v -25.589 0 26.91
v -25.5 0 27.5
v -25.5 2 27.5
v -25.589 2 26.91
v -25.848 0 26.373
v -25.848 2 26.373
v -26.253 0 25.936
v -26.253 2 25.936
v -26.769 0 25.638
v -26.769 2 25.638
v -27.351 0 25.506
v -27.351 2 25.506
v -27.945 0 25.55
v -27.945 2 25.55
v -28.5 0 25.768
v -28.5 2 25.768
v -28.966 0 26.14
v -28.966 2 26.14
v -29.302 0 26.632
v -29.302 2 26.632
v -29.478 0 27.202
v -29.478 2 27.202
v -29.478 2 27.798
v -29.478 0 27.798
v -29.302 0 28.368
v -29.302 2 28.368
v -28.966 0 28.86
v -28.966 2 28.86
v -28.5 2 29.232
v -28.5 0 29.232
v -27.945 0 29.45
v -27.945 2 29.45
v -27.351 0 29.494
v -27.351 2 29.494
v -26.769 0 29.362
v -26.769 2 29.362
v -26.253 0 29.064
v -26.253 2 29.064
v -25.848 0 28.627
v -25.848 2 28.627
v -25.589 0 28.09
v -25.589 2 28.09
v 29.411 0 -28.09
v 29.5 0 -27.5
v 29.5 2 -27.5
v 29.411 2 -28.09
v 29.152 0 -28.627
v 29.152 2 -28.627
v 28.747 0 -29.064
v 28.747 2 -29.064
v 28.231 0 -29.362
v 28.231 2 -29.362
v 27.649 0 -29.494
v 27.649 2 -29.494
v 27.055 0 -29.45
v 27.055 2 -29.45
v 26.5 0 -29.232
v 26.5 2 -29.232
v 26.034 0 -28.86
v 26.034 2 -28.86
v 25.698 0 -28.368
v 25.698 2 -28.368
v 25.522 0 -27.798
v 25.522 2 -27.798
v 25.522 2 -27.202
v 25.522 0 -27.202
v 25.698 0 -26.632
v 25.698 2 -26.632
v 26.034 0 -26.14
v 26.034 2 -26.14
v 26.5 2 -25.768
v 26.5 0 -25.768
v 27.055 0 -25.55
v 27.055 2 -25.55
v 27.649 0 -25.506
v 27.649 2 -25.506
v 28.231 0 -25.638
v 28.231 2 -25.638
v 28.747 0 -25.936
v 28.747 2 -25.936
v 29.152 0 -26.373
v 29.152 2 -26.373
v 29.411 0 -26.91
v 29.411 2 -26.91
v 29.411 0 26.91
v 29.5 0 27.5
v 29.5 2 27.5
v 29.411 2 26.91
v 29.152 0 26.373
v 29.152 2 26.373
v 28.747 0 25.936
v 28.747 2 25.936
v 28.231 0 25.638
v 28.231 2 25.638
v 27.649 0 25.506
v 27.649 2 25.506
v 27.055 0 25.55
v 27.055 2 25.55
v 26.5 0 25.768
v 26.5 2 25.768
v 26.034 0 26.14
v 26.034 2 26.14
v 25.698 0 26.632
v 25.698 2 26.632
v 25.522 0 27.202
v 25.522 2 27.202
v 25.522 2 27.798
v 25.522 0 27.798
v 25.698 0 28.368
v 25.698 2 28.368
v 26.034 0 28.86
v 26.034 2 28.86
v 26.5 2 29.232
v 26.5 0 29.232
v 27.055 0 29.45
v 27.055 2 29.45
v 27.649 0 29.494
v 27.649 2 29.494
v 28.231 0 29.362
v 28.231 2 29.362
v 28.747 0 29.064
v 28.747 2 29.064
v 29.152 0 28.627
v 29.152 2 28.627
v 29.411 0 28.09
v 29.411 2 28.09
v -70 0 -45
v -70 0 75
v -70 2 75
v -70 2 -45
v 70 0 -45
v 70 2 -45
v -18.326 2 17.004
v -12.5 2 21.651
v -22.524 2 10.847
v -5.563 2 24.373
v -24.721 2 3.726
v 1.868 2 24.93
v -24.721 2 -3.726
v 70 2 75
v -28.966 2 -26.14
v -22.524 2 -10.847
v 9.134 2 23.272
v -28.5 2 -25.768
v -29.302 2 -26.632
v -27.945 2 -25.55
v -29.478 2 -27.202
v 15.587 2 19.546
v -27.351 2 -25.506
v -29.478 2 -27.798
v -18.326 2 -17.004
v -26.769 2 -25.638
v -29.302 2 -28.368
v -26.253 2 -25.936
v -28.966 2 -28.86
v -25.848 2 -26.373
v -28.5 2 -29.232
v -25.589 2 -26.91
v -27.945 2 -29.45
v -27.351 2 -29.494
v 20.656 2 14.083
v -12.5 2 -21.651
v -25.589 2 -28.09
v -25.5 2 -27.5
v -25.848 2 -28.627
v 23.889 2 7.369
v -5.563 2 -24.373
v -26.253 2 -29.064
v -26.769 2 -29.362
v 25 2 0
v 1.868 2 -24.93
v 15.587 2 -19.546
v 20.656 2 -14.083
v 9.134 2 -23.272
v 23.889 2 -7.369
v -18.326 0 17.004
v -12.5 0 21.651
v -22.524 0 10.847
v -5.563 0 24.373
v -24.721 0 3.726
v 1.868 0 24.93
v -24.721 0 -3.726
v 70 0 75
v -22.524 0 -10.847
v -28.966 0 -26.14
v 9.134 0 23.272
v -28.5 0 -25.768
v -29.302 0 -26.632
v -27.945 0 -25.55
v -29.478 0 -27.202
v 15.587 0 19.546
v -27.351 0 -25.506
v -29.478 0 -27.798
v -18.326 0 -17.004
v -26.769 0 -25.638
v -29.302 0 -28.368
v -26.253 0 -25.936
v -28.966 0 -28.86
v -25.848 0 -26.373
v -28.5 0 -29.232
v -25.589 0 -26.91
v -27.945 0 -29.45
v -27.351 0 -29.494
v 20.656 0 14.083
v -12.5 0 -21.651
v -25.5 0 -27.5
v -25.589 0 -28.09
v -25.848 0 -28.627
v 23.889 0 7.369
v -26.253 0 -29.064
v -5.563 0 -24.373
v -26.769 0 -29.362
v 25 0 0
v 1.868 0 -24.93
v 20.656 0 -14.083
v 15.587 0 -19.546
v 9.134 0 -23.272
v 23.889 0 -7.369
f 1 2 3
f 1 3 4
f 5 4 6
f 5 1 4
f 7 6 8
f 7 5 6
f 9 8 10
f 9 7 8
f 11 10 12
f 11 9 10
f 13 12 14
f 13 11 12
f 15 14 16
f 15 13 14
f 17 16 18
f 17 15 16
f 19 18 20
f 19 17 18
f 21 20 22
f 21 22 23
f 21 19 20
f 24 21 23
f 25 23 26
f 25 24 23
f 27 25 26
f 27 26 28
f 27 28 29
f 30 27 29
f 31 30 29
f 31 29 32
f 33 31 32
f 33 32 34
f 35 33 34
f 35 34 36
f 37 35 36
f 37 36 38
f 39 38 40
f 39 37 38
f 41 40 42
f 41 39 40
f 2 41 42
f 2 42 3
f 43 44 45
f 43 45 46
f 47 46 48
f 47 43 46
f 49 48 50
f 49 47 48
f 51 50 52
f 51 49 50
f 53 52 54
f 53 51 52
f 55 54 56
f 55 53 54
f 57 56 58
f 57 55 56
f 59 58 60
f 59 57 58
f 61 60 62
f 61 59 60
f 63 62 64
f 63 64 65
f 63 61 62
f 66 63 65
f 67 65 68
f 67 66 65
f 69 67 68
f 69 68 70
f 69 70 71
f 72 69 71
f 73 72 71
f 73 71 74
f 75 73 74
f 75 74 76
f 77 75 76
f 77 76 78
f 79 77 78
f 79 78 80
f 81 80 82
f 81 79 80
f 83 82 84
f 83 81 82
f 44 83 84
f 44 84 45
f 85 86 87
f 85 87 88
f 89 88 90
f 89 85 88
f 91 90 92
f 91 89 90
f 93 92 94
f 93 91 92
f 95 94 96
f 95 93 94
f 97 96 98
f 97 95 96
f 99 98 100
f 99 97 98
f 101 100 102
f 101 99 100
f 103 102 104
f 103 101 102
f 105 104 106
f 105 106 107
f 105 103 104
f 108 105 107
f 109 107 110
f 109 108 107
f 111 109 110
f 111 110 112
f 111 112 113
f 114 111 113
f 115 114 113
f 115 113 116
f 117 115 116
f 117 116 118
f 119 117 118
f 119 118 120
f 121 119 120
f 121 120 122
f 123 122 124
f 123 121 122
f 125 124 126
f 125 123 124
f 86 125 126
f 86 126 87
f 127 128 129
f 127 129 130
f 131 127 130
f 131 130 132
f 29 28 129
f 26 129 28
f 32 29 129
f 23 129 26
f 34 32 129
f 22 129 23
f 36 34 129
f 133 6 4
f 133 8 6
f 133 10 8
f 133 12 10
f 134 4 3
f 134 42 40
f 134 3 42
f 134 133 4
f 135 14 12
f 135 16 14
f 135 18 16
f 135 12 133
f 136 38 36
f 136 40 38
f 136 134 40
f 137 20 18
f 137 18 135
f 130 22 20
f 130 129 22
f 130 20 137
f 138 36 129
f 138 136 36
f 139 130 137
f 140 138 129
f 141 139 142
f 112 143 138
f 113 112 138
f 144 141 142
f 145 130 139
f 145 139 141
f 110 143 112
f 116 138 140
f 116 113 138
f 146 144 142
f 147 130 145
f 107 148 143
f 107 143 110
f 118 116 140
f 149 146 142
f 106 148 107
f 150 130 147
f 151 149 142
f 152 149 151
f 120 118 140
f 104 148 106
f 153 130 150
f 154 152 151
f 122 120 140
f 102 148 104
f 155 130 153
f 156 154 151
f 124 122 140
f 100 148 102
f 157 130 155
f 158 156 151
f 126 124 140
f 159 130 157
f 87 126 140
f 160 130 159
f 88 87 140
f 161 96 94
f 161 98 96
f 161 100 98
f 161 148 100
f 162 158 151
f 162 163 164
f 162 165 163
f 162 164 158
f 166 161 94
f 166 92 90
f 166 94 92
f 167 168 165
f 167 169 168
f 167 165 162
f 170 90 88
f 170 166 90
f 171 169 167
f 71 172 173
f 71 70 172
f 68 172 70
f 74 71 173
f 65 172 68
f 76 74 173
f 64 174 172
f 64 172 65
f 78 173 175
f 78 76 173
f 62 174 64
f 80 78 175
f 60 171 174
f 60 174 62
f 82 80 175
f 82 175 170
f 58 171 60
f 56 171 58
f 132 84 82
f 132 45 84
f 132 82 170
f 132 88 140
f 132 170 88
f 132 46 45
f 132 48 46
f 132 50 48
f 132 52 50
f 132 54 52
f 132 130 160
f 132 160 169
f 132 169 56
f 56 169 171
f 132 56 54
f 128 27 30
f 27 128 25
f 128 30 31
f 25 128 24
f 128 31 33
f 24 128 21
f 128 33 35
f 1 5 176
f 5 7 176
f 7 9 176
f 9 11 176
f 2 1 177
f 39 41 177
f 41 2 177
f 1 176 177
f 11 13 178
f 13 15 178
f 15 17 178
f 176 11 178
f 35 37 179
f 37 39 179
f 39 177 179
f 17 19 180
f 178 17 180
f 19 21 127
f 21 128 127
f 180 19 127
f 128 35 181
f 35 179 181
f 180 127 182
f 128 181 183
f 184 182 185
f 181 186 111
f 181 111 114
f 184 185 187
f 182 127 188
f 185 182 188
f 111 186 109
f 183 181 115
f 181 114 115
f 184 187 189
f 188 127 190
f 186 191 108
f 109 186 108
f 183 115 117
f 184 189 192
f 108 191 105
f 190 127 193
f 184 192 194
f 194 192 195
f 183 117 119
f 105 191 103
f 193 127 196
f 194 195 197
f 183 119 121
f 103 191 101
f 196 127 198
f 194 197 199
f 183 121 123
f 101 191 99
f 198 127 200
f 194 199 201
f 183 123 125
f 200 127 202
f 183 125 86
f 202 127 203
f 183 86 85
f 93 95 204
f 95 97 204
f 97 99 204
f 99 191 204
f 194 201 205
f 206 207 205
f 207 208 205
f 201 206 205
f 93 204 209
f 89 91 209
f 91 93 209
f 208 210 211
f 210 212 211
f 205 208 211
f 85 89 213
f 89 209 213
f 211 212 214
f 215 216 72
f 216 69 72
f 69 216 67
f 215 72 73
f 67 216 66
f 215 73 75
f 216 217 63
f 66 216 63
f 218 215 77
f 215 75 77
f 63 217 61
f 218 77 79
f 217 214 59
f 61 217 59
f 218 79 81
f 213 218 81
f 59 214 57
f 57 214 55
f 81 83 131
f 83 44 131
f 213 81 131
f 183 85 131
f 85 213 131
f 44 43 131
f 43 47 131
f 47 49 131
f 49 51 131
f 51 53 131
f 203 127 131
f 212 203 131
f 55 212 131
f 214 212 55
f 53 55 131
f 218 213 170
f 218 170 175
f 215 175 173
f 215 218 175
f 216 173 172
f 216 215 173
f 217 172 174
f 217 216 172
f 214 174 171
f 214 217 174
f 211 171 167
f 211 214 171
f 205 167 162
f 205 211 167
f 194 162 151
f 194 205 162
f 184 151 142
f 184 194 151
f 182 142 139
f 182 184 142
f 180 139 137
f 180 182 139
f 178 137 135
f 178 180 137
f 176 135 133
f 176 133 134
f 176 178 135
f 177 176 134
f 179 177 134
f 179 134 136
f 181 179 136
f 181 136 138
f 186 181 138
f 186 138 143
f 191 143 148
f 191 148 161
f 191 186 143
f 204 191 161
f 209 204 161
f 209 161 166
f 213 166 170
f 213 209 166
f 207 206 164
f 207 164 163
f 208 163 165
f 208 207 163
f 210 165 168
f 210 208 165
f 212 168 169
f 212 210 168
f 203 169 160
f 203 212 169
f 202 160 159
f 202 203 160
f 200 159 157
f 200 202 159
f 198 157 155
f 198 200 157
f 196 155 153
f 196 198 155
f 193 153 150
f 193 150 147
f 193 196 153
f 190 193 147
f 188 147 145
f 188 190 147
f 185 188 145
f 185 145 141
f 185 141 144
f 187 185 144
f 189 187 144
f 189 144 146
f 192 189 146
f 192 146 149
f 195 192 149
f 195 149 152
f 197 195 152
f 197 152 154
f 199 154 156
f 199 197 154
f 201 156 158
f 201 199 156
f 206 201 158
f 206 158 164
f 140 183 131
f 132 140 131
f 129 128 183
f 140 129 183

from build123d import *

# Parameters (mm, degrees)
SKETCH_1_W      = 140
SKETCH_1_H      = 120
SKETCH_1_R      = 2
SKETCH_1_R_2    = 25
EXTRUDE_1_DEPTH = 2


with BuildPart() as part:
    # Эскиз1 → Бобышка-Вытянуть1 (new body)
    with BuildSketch(Plane(origin=(0, 0, 0), x_dir=(1, 0, 0), z_dir=(0, 1, 0))):
        with Locations((0, -15)):
            Rectangle(SKETCH_1_W, SKETCH_1_H)
        with Locations((27.5, 27.5)):
            Circle(SKETCH_1_R, mode=Mode.SUBTRACT)
        with Locations((-27.5, 27.5)):
            Circle(SKETCH_1_R, mode=Mode.SUBTRACT)
        with Locations((-27.5, -27.5)):
            Circle(SKETCH_1_R, mode=Mode.SUBTRACT)
        with Locations((27.5, -27.5)):
            Circle(SKETCH_1_R, mode=Mode.SUBTRACT)
        Circle(SKETCH_1_R_2, mode=Mode.SUBTRACT)
    extrude(amount=EXTRUDE_1_DEPTH)


solid = part.part
